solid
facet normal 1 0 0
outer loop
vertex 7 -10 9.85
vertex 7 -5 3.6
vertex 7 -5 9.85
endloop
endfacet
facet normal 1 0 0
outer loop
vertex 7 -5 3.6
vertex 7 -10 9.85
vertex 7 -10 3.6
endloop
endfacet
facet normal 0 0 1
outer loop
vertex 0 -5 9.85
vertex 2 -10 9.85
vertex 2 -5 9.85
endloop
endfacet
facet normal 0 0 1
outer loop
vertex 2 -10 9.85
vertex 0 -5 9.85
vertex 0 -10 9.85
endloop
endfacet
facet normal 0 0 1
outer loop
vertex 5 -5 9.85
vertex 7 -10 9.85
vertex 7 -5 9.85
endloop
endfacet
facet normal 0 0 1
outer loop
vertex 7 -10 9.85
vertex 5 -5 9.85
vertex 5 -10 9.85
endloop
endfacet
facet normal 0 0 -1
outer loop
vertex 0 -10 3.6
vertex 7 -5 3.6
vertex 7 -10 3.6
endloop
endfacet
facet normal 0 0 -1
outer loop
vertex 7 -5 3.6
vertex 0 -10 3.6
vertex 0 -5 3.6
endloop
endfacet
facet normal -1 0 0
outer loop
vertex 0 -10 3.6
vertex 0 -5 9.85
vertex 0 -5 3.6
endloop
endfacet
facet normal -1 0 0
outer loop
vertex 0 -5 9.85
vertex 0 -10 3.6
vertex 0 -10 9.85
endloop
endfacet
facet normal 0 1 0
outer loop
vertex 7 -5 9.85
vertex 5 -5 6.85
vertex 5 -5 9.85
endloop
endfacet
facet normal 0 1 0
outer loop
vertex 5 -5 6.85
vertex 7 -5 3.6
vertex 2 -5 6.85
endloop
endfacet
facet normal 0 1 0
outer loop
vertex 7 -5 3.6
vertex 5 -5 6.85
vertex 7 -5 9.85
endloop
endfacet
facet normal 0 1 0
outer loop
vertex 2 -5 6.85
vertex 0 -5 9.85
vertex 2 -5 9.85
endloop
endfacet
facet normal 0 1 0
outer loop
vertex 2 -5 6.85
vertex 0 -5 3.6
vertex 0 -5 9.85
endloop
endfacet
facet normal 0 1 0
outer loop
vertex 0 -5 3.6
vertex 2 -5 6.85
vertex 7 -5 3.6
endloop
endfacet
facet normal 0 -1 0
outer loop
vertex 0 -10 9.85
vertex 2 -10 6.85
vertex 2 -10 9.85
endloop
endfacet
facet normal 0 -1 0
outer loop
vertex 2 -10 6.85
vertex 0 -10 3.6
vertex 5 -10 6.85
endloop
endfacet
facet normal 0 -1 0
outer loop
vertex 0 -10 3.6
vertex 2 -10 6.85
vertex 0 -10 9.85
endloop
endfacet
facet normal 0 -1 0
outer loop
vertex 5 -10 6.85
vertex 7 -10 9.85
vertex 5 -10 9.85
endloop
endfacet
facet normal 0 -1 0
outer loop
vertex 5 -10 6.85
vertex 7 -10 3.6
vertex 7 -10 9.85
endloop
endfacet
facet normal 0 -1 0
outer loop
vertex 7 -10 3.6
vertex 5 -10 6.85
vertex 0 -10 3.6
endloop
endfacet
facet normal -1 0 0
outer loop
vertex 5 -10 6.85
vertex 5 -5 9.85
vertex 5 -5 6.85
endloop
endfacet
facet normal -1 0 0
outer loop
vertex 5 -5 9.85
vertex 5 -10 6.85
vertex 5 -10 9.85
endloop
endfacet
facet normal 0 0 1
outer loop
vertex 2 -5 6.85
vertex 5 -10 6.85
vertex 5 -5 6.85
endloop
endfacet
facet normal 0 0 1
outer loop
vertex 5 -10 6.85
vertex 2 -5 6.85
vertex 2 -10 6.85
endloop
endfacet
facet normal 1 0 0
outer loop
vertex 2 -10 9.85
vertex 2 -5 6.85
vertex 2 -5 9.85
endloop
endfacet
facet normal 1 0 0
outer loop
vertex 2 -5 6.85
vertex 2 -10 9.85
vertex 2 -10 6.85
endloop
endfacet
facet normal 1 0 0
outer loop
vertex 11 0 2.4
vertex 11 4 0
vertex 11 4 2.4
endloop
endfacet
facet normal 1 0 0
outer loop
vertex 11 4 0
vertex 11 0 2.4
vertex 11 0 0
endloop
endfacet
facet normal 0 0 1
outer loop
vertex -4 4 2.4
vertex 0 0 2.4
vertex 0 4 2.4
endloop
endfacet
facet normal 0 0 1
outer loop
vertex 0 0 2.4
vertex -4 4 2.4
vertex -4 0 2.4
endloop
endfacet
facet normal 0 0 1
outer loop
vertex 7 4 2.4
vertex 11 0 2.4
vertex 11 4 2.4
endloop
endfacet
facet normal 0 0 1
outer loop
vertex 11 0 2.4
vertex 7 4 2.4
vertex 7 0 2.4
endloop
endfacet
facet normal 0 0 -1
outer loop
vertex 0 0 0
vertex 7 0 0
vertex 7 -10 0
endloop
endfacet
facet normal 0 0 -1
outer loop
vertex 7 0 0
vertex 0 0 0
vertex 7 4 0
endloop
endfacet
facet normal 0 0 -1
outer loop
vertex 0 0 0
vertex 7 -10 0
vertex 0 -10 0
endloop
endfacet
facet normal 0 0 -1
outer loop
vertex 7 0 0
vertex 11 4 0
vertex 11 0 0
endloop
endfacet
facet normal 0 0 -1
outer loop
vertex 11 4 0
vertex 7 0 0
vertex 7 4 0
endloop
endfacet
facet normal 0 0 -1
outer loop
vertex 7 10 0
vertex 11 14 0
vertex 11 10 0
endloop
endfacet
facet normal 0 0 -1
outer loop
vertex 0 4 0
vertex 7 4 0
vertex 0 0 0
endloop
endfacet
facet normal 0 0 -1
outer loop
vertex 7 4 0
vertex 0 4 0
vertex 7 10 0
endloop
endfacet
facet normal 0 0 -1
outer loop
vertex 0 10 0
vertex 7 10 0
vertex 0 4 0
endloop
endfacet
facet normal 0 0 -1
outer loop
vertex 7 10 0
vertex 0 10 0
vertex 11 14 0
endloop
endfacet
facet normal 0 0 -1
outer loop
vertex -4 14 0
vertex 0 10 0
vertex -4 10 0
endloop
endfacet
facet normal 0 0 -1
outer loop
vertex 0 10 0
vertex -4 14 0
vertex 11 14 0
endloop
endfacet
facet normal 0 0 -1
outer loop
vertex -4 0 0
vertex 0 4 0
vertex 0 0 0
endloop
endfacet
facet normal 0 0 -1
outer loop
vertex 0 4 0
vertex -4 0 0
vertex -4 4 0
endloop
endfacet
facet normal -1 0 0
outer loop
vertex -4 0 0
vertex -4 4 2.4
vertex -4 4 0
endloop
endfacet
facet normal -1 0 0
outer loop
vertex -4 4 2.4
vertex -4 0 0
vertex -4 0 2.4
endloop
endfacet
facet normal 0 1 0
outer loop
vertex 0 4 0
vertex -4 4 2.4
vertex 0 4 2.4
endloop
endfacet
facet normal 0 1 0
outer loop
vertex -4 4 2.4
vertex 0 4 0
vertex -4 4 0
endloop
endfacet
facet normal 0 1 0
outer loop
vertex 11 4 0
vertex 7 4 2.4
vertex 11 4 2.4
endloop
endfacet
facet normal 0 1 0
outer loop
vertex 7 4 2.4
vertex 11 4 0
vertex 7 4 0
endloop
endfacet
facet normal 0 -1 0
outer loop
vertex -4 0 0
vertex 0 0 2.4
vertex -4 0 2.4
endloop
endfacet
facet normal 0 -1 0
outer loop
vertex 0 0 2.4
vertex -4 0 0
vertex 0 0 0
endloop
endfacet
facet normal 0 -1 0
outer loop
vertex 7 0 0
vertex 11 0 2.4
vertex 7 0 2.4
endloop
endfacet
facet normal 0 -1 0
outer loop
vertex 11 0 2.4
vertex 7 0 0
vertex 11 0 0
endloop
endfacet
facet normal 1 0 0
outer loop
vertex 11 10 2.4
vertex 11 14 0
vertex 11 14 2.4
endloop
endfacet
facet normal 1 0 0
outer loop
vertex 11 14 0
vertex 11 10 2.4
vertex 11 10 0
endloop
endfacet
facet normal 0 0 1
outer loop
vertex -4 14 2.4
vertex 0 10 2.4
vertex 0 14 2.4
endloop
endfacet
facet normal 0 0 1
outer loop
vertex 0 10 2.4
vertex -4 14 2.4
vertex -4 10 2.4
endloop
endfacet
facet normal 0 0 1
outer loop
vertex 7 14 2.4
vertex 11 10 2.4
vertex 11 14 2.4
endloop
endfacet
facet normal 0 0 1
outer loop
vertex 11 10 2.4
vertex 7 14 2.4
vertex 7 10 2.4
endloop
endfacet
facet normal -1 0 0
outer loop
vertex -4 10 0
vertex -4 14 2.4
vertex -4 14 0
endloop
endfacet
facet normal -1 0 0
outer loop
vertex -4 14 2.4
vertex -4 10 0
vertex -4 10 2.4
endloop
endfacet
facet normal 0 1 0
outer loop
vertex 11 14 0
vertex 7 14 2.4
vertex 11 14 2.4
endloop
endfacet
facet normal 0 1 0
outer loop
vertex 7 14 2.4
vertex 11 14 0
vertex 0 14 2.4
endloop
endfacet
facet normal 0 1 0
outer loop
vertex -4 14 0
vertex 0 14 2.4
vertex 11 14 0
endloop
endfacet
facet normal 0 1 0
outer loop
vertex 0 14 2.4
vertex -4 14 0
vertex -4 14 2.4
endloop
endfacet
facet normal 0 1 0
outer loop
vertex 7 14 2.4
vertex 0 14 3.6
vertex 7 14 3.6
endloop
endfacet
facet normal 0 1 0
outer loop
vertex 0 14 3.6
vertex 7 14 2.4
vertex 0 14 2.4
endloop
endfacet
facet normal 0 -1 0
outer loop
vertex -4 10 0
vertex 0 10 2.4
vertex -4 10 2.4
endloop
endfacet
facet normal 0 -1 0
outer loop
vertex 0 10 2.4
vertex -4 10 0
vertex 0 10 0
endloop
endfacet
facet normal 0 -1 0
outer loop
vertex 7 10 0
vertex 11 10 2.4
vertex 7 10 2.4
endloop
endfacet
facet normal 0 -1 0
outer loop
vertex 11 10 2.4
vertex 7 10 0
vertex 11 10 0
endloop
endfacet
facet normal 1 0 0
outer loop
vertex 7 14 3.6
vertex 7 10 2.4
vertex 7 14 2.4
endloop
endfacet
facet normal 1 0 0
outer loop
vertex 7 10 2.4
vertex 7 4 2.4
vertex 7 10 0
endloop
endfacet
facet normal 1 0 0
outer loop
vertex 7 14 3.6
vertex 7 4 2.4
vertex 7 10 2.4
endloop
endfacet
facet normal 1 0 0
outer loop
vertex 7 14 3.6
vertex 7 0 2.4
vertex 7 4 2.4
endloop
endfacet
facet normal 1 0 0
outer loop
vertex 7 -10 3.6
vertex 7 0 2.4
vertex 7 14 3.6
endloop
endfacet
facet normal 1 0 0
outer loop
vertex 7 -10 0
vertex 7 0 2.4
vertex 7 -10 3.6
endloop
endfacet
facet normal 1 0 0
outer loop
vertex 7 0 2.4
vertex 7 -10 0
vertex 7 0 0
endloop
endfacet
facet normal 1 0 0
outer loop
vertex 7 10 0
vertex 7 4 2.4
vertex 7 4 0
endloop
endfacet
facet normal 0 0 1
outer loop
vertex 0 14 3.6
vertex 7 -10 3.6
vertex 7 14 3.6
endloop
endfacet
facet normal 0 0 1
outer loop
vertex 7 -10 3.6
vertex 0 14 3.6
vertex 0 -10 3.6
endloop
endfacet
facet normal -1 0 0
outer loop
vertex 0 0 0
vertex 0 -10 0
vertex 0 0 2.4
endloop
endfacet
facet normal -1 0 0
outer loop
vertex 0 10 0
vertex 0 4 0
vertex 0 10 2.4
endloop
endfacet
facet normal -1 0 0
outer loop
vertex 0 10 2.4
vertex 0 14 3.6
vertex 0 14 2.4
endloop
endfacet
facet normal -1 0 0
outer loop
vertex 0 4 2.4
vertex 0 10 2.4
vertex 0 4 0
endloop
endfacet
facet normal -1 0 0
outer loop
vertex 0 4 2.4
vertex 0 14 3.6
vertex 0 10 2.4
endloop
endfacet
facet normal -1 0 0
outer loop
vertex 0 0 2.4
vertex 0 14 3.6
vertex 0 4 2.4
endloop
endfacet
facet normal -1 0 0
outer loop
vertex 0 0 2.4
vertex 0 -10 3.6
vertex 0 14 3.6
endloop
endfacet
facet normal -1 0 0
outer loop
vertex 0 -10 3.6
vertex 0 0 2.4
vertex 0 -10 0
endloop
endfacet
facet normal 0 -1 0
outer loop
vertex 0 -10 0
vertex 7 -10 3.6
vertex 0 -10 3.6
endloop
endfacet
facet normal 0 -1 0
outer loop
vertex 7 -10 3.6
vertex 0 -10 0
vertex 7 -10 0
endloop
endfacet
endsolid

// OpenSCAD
module nailstemholder(radius,headradius)
{
  difference()
  {
    cube(size=[2*radius+4,5,headradius+radius]);

    translate(v=[2,0,headradius-radius])
      cube(size=[2*radius,5,2*radius]);
  }
}

module coilholder()
{
  translate(v=[-4,0,0])
    cube(size=[15,4,2.4]);
  translate(v=[-4,10,0])
    cube(size=[15,4,2.4]);

  translate(v=[0,-10,0])
    cube(size=[7,24,3.6]);

  translate(v=[0,-10,3.6])
    nailstemholder(1.5,4.75);

}

coilholder();
